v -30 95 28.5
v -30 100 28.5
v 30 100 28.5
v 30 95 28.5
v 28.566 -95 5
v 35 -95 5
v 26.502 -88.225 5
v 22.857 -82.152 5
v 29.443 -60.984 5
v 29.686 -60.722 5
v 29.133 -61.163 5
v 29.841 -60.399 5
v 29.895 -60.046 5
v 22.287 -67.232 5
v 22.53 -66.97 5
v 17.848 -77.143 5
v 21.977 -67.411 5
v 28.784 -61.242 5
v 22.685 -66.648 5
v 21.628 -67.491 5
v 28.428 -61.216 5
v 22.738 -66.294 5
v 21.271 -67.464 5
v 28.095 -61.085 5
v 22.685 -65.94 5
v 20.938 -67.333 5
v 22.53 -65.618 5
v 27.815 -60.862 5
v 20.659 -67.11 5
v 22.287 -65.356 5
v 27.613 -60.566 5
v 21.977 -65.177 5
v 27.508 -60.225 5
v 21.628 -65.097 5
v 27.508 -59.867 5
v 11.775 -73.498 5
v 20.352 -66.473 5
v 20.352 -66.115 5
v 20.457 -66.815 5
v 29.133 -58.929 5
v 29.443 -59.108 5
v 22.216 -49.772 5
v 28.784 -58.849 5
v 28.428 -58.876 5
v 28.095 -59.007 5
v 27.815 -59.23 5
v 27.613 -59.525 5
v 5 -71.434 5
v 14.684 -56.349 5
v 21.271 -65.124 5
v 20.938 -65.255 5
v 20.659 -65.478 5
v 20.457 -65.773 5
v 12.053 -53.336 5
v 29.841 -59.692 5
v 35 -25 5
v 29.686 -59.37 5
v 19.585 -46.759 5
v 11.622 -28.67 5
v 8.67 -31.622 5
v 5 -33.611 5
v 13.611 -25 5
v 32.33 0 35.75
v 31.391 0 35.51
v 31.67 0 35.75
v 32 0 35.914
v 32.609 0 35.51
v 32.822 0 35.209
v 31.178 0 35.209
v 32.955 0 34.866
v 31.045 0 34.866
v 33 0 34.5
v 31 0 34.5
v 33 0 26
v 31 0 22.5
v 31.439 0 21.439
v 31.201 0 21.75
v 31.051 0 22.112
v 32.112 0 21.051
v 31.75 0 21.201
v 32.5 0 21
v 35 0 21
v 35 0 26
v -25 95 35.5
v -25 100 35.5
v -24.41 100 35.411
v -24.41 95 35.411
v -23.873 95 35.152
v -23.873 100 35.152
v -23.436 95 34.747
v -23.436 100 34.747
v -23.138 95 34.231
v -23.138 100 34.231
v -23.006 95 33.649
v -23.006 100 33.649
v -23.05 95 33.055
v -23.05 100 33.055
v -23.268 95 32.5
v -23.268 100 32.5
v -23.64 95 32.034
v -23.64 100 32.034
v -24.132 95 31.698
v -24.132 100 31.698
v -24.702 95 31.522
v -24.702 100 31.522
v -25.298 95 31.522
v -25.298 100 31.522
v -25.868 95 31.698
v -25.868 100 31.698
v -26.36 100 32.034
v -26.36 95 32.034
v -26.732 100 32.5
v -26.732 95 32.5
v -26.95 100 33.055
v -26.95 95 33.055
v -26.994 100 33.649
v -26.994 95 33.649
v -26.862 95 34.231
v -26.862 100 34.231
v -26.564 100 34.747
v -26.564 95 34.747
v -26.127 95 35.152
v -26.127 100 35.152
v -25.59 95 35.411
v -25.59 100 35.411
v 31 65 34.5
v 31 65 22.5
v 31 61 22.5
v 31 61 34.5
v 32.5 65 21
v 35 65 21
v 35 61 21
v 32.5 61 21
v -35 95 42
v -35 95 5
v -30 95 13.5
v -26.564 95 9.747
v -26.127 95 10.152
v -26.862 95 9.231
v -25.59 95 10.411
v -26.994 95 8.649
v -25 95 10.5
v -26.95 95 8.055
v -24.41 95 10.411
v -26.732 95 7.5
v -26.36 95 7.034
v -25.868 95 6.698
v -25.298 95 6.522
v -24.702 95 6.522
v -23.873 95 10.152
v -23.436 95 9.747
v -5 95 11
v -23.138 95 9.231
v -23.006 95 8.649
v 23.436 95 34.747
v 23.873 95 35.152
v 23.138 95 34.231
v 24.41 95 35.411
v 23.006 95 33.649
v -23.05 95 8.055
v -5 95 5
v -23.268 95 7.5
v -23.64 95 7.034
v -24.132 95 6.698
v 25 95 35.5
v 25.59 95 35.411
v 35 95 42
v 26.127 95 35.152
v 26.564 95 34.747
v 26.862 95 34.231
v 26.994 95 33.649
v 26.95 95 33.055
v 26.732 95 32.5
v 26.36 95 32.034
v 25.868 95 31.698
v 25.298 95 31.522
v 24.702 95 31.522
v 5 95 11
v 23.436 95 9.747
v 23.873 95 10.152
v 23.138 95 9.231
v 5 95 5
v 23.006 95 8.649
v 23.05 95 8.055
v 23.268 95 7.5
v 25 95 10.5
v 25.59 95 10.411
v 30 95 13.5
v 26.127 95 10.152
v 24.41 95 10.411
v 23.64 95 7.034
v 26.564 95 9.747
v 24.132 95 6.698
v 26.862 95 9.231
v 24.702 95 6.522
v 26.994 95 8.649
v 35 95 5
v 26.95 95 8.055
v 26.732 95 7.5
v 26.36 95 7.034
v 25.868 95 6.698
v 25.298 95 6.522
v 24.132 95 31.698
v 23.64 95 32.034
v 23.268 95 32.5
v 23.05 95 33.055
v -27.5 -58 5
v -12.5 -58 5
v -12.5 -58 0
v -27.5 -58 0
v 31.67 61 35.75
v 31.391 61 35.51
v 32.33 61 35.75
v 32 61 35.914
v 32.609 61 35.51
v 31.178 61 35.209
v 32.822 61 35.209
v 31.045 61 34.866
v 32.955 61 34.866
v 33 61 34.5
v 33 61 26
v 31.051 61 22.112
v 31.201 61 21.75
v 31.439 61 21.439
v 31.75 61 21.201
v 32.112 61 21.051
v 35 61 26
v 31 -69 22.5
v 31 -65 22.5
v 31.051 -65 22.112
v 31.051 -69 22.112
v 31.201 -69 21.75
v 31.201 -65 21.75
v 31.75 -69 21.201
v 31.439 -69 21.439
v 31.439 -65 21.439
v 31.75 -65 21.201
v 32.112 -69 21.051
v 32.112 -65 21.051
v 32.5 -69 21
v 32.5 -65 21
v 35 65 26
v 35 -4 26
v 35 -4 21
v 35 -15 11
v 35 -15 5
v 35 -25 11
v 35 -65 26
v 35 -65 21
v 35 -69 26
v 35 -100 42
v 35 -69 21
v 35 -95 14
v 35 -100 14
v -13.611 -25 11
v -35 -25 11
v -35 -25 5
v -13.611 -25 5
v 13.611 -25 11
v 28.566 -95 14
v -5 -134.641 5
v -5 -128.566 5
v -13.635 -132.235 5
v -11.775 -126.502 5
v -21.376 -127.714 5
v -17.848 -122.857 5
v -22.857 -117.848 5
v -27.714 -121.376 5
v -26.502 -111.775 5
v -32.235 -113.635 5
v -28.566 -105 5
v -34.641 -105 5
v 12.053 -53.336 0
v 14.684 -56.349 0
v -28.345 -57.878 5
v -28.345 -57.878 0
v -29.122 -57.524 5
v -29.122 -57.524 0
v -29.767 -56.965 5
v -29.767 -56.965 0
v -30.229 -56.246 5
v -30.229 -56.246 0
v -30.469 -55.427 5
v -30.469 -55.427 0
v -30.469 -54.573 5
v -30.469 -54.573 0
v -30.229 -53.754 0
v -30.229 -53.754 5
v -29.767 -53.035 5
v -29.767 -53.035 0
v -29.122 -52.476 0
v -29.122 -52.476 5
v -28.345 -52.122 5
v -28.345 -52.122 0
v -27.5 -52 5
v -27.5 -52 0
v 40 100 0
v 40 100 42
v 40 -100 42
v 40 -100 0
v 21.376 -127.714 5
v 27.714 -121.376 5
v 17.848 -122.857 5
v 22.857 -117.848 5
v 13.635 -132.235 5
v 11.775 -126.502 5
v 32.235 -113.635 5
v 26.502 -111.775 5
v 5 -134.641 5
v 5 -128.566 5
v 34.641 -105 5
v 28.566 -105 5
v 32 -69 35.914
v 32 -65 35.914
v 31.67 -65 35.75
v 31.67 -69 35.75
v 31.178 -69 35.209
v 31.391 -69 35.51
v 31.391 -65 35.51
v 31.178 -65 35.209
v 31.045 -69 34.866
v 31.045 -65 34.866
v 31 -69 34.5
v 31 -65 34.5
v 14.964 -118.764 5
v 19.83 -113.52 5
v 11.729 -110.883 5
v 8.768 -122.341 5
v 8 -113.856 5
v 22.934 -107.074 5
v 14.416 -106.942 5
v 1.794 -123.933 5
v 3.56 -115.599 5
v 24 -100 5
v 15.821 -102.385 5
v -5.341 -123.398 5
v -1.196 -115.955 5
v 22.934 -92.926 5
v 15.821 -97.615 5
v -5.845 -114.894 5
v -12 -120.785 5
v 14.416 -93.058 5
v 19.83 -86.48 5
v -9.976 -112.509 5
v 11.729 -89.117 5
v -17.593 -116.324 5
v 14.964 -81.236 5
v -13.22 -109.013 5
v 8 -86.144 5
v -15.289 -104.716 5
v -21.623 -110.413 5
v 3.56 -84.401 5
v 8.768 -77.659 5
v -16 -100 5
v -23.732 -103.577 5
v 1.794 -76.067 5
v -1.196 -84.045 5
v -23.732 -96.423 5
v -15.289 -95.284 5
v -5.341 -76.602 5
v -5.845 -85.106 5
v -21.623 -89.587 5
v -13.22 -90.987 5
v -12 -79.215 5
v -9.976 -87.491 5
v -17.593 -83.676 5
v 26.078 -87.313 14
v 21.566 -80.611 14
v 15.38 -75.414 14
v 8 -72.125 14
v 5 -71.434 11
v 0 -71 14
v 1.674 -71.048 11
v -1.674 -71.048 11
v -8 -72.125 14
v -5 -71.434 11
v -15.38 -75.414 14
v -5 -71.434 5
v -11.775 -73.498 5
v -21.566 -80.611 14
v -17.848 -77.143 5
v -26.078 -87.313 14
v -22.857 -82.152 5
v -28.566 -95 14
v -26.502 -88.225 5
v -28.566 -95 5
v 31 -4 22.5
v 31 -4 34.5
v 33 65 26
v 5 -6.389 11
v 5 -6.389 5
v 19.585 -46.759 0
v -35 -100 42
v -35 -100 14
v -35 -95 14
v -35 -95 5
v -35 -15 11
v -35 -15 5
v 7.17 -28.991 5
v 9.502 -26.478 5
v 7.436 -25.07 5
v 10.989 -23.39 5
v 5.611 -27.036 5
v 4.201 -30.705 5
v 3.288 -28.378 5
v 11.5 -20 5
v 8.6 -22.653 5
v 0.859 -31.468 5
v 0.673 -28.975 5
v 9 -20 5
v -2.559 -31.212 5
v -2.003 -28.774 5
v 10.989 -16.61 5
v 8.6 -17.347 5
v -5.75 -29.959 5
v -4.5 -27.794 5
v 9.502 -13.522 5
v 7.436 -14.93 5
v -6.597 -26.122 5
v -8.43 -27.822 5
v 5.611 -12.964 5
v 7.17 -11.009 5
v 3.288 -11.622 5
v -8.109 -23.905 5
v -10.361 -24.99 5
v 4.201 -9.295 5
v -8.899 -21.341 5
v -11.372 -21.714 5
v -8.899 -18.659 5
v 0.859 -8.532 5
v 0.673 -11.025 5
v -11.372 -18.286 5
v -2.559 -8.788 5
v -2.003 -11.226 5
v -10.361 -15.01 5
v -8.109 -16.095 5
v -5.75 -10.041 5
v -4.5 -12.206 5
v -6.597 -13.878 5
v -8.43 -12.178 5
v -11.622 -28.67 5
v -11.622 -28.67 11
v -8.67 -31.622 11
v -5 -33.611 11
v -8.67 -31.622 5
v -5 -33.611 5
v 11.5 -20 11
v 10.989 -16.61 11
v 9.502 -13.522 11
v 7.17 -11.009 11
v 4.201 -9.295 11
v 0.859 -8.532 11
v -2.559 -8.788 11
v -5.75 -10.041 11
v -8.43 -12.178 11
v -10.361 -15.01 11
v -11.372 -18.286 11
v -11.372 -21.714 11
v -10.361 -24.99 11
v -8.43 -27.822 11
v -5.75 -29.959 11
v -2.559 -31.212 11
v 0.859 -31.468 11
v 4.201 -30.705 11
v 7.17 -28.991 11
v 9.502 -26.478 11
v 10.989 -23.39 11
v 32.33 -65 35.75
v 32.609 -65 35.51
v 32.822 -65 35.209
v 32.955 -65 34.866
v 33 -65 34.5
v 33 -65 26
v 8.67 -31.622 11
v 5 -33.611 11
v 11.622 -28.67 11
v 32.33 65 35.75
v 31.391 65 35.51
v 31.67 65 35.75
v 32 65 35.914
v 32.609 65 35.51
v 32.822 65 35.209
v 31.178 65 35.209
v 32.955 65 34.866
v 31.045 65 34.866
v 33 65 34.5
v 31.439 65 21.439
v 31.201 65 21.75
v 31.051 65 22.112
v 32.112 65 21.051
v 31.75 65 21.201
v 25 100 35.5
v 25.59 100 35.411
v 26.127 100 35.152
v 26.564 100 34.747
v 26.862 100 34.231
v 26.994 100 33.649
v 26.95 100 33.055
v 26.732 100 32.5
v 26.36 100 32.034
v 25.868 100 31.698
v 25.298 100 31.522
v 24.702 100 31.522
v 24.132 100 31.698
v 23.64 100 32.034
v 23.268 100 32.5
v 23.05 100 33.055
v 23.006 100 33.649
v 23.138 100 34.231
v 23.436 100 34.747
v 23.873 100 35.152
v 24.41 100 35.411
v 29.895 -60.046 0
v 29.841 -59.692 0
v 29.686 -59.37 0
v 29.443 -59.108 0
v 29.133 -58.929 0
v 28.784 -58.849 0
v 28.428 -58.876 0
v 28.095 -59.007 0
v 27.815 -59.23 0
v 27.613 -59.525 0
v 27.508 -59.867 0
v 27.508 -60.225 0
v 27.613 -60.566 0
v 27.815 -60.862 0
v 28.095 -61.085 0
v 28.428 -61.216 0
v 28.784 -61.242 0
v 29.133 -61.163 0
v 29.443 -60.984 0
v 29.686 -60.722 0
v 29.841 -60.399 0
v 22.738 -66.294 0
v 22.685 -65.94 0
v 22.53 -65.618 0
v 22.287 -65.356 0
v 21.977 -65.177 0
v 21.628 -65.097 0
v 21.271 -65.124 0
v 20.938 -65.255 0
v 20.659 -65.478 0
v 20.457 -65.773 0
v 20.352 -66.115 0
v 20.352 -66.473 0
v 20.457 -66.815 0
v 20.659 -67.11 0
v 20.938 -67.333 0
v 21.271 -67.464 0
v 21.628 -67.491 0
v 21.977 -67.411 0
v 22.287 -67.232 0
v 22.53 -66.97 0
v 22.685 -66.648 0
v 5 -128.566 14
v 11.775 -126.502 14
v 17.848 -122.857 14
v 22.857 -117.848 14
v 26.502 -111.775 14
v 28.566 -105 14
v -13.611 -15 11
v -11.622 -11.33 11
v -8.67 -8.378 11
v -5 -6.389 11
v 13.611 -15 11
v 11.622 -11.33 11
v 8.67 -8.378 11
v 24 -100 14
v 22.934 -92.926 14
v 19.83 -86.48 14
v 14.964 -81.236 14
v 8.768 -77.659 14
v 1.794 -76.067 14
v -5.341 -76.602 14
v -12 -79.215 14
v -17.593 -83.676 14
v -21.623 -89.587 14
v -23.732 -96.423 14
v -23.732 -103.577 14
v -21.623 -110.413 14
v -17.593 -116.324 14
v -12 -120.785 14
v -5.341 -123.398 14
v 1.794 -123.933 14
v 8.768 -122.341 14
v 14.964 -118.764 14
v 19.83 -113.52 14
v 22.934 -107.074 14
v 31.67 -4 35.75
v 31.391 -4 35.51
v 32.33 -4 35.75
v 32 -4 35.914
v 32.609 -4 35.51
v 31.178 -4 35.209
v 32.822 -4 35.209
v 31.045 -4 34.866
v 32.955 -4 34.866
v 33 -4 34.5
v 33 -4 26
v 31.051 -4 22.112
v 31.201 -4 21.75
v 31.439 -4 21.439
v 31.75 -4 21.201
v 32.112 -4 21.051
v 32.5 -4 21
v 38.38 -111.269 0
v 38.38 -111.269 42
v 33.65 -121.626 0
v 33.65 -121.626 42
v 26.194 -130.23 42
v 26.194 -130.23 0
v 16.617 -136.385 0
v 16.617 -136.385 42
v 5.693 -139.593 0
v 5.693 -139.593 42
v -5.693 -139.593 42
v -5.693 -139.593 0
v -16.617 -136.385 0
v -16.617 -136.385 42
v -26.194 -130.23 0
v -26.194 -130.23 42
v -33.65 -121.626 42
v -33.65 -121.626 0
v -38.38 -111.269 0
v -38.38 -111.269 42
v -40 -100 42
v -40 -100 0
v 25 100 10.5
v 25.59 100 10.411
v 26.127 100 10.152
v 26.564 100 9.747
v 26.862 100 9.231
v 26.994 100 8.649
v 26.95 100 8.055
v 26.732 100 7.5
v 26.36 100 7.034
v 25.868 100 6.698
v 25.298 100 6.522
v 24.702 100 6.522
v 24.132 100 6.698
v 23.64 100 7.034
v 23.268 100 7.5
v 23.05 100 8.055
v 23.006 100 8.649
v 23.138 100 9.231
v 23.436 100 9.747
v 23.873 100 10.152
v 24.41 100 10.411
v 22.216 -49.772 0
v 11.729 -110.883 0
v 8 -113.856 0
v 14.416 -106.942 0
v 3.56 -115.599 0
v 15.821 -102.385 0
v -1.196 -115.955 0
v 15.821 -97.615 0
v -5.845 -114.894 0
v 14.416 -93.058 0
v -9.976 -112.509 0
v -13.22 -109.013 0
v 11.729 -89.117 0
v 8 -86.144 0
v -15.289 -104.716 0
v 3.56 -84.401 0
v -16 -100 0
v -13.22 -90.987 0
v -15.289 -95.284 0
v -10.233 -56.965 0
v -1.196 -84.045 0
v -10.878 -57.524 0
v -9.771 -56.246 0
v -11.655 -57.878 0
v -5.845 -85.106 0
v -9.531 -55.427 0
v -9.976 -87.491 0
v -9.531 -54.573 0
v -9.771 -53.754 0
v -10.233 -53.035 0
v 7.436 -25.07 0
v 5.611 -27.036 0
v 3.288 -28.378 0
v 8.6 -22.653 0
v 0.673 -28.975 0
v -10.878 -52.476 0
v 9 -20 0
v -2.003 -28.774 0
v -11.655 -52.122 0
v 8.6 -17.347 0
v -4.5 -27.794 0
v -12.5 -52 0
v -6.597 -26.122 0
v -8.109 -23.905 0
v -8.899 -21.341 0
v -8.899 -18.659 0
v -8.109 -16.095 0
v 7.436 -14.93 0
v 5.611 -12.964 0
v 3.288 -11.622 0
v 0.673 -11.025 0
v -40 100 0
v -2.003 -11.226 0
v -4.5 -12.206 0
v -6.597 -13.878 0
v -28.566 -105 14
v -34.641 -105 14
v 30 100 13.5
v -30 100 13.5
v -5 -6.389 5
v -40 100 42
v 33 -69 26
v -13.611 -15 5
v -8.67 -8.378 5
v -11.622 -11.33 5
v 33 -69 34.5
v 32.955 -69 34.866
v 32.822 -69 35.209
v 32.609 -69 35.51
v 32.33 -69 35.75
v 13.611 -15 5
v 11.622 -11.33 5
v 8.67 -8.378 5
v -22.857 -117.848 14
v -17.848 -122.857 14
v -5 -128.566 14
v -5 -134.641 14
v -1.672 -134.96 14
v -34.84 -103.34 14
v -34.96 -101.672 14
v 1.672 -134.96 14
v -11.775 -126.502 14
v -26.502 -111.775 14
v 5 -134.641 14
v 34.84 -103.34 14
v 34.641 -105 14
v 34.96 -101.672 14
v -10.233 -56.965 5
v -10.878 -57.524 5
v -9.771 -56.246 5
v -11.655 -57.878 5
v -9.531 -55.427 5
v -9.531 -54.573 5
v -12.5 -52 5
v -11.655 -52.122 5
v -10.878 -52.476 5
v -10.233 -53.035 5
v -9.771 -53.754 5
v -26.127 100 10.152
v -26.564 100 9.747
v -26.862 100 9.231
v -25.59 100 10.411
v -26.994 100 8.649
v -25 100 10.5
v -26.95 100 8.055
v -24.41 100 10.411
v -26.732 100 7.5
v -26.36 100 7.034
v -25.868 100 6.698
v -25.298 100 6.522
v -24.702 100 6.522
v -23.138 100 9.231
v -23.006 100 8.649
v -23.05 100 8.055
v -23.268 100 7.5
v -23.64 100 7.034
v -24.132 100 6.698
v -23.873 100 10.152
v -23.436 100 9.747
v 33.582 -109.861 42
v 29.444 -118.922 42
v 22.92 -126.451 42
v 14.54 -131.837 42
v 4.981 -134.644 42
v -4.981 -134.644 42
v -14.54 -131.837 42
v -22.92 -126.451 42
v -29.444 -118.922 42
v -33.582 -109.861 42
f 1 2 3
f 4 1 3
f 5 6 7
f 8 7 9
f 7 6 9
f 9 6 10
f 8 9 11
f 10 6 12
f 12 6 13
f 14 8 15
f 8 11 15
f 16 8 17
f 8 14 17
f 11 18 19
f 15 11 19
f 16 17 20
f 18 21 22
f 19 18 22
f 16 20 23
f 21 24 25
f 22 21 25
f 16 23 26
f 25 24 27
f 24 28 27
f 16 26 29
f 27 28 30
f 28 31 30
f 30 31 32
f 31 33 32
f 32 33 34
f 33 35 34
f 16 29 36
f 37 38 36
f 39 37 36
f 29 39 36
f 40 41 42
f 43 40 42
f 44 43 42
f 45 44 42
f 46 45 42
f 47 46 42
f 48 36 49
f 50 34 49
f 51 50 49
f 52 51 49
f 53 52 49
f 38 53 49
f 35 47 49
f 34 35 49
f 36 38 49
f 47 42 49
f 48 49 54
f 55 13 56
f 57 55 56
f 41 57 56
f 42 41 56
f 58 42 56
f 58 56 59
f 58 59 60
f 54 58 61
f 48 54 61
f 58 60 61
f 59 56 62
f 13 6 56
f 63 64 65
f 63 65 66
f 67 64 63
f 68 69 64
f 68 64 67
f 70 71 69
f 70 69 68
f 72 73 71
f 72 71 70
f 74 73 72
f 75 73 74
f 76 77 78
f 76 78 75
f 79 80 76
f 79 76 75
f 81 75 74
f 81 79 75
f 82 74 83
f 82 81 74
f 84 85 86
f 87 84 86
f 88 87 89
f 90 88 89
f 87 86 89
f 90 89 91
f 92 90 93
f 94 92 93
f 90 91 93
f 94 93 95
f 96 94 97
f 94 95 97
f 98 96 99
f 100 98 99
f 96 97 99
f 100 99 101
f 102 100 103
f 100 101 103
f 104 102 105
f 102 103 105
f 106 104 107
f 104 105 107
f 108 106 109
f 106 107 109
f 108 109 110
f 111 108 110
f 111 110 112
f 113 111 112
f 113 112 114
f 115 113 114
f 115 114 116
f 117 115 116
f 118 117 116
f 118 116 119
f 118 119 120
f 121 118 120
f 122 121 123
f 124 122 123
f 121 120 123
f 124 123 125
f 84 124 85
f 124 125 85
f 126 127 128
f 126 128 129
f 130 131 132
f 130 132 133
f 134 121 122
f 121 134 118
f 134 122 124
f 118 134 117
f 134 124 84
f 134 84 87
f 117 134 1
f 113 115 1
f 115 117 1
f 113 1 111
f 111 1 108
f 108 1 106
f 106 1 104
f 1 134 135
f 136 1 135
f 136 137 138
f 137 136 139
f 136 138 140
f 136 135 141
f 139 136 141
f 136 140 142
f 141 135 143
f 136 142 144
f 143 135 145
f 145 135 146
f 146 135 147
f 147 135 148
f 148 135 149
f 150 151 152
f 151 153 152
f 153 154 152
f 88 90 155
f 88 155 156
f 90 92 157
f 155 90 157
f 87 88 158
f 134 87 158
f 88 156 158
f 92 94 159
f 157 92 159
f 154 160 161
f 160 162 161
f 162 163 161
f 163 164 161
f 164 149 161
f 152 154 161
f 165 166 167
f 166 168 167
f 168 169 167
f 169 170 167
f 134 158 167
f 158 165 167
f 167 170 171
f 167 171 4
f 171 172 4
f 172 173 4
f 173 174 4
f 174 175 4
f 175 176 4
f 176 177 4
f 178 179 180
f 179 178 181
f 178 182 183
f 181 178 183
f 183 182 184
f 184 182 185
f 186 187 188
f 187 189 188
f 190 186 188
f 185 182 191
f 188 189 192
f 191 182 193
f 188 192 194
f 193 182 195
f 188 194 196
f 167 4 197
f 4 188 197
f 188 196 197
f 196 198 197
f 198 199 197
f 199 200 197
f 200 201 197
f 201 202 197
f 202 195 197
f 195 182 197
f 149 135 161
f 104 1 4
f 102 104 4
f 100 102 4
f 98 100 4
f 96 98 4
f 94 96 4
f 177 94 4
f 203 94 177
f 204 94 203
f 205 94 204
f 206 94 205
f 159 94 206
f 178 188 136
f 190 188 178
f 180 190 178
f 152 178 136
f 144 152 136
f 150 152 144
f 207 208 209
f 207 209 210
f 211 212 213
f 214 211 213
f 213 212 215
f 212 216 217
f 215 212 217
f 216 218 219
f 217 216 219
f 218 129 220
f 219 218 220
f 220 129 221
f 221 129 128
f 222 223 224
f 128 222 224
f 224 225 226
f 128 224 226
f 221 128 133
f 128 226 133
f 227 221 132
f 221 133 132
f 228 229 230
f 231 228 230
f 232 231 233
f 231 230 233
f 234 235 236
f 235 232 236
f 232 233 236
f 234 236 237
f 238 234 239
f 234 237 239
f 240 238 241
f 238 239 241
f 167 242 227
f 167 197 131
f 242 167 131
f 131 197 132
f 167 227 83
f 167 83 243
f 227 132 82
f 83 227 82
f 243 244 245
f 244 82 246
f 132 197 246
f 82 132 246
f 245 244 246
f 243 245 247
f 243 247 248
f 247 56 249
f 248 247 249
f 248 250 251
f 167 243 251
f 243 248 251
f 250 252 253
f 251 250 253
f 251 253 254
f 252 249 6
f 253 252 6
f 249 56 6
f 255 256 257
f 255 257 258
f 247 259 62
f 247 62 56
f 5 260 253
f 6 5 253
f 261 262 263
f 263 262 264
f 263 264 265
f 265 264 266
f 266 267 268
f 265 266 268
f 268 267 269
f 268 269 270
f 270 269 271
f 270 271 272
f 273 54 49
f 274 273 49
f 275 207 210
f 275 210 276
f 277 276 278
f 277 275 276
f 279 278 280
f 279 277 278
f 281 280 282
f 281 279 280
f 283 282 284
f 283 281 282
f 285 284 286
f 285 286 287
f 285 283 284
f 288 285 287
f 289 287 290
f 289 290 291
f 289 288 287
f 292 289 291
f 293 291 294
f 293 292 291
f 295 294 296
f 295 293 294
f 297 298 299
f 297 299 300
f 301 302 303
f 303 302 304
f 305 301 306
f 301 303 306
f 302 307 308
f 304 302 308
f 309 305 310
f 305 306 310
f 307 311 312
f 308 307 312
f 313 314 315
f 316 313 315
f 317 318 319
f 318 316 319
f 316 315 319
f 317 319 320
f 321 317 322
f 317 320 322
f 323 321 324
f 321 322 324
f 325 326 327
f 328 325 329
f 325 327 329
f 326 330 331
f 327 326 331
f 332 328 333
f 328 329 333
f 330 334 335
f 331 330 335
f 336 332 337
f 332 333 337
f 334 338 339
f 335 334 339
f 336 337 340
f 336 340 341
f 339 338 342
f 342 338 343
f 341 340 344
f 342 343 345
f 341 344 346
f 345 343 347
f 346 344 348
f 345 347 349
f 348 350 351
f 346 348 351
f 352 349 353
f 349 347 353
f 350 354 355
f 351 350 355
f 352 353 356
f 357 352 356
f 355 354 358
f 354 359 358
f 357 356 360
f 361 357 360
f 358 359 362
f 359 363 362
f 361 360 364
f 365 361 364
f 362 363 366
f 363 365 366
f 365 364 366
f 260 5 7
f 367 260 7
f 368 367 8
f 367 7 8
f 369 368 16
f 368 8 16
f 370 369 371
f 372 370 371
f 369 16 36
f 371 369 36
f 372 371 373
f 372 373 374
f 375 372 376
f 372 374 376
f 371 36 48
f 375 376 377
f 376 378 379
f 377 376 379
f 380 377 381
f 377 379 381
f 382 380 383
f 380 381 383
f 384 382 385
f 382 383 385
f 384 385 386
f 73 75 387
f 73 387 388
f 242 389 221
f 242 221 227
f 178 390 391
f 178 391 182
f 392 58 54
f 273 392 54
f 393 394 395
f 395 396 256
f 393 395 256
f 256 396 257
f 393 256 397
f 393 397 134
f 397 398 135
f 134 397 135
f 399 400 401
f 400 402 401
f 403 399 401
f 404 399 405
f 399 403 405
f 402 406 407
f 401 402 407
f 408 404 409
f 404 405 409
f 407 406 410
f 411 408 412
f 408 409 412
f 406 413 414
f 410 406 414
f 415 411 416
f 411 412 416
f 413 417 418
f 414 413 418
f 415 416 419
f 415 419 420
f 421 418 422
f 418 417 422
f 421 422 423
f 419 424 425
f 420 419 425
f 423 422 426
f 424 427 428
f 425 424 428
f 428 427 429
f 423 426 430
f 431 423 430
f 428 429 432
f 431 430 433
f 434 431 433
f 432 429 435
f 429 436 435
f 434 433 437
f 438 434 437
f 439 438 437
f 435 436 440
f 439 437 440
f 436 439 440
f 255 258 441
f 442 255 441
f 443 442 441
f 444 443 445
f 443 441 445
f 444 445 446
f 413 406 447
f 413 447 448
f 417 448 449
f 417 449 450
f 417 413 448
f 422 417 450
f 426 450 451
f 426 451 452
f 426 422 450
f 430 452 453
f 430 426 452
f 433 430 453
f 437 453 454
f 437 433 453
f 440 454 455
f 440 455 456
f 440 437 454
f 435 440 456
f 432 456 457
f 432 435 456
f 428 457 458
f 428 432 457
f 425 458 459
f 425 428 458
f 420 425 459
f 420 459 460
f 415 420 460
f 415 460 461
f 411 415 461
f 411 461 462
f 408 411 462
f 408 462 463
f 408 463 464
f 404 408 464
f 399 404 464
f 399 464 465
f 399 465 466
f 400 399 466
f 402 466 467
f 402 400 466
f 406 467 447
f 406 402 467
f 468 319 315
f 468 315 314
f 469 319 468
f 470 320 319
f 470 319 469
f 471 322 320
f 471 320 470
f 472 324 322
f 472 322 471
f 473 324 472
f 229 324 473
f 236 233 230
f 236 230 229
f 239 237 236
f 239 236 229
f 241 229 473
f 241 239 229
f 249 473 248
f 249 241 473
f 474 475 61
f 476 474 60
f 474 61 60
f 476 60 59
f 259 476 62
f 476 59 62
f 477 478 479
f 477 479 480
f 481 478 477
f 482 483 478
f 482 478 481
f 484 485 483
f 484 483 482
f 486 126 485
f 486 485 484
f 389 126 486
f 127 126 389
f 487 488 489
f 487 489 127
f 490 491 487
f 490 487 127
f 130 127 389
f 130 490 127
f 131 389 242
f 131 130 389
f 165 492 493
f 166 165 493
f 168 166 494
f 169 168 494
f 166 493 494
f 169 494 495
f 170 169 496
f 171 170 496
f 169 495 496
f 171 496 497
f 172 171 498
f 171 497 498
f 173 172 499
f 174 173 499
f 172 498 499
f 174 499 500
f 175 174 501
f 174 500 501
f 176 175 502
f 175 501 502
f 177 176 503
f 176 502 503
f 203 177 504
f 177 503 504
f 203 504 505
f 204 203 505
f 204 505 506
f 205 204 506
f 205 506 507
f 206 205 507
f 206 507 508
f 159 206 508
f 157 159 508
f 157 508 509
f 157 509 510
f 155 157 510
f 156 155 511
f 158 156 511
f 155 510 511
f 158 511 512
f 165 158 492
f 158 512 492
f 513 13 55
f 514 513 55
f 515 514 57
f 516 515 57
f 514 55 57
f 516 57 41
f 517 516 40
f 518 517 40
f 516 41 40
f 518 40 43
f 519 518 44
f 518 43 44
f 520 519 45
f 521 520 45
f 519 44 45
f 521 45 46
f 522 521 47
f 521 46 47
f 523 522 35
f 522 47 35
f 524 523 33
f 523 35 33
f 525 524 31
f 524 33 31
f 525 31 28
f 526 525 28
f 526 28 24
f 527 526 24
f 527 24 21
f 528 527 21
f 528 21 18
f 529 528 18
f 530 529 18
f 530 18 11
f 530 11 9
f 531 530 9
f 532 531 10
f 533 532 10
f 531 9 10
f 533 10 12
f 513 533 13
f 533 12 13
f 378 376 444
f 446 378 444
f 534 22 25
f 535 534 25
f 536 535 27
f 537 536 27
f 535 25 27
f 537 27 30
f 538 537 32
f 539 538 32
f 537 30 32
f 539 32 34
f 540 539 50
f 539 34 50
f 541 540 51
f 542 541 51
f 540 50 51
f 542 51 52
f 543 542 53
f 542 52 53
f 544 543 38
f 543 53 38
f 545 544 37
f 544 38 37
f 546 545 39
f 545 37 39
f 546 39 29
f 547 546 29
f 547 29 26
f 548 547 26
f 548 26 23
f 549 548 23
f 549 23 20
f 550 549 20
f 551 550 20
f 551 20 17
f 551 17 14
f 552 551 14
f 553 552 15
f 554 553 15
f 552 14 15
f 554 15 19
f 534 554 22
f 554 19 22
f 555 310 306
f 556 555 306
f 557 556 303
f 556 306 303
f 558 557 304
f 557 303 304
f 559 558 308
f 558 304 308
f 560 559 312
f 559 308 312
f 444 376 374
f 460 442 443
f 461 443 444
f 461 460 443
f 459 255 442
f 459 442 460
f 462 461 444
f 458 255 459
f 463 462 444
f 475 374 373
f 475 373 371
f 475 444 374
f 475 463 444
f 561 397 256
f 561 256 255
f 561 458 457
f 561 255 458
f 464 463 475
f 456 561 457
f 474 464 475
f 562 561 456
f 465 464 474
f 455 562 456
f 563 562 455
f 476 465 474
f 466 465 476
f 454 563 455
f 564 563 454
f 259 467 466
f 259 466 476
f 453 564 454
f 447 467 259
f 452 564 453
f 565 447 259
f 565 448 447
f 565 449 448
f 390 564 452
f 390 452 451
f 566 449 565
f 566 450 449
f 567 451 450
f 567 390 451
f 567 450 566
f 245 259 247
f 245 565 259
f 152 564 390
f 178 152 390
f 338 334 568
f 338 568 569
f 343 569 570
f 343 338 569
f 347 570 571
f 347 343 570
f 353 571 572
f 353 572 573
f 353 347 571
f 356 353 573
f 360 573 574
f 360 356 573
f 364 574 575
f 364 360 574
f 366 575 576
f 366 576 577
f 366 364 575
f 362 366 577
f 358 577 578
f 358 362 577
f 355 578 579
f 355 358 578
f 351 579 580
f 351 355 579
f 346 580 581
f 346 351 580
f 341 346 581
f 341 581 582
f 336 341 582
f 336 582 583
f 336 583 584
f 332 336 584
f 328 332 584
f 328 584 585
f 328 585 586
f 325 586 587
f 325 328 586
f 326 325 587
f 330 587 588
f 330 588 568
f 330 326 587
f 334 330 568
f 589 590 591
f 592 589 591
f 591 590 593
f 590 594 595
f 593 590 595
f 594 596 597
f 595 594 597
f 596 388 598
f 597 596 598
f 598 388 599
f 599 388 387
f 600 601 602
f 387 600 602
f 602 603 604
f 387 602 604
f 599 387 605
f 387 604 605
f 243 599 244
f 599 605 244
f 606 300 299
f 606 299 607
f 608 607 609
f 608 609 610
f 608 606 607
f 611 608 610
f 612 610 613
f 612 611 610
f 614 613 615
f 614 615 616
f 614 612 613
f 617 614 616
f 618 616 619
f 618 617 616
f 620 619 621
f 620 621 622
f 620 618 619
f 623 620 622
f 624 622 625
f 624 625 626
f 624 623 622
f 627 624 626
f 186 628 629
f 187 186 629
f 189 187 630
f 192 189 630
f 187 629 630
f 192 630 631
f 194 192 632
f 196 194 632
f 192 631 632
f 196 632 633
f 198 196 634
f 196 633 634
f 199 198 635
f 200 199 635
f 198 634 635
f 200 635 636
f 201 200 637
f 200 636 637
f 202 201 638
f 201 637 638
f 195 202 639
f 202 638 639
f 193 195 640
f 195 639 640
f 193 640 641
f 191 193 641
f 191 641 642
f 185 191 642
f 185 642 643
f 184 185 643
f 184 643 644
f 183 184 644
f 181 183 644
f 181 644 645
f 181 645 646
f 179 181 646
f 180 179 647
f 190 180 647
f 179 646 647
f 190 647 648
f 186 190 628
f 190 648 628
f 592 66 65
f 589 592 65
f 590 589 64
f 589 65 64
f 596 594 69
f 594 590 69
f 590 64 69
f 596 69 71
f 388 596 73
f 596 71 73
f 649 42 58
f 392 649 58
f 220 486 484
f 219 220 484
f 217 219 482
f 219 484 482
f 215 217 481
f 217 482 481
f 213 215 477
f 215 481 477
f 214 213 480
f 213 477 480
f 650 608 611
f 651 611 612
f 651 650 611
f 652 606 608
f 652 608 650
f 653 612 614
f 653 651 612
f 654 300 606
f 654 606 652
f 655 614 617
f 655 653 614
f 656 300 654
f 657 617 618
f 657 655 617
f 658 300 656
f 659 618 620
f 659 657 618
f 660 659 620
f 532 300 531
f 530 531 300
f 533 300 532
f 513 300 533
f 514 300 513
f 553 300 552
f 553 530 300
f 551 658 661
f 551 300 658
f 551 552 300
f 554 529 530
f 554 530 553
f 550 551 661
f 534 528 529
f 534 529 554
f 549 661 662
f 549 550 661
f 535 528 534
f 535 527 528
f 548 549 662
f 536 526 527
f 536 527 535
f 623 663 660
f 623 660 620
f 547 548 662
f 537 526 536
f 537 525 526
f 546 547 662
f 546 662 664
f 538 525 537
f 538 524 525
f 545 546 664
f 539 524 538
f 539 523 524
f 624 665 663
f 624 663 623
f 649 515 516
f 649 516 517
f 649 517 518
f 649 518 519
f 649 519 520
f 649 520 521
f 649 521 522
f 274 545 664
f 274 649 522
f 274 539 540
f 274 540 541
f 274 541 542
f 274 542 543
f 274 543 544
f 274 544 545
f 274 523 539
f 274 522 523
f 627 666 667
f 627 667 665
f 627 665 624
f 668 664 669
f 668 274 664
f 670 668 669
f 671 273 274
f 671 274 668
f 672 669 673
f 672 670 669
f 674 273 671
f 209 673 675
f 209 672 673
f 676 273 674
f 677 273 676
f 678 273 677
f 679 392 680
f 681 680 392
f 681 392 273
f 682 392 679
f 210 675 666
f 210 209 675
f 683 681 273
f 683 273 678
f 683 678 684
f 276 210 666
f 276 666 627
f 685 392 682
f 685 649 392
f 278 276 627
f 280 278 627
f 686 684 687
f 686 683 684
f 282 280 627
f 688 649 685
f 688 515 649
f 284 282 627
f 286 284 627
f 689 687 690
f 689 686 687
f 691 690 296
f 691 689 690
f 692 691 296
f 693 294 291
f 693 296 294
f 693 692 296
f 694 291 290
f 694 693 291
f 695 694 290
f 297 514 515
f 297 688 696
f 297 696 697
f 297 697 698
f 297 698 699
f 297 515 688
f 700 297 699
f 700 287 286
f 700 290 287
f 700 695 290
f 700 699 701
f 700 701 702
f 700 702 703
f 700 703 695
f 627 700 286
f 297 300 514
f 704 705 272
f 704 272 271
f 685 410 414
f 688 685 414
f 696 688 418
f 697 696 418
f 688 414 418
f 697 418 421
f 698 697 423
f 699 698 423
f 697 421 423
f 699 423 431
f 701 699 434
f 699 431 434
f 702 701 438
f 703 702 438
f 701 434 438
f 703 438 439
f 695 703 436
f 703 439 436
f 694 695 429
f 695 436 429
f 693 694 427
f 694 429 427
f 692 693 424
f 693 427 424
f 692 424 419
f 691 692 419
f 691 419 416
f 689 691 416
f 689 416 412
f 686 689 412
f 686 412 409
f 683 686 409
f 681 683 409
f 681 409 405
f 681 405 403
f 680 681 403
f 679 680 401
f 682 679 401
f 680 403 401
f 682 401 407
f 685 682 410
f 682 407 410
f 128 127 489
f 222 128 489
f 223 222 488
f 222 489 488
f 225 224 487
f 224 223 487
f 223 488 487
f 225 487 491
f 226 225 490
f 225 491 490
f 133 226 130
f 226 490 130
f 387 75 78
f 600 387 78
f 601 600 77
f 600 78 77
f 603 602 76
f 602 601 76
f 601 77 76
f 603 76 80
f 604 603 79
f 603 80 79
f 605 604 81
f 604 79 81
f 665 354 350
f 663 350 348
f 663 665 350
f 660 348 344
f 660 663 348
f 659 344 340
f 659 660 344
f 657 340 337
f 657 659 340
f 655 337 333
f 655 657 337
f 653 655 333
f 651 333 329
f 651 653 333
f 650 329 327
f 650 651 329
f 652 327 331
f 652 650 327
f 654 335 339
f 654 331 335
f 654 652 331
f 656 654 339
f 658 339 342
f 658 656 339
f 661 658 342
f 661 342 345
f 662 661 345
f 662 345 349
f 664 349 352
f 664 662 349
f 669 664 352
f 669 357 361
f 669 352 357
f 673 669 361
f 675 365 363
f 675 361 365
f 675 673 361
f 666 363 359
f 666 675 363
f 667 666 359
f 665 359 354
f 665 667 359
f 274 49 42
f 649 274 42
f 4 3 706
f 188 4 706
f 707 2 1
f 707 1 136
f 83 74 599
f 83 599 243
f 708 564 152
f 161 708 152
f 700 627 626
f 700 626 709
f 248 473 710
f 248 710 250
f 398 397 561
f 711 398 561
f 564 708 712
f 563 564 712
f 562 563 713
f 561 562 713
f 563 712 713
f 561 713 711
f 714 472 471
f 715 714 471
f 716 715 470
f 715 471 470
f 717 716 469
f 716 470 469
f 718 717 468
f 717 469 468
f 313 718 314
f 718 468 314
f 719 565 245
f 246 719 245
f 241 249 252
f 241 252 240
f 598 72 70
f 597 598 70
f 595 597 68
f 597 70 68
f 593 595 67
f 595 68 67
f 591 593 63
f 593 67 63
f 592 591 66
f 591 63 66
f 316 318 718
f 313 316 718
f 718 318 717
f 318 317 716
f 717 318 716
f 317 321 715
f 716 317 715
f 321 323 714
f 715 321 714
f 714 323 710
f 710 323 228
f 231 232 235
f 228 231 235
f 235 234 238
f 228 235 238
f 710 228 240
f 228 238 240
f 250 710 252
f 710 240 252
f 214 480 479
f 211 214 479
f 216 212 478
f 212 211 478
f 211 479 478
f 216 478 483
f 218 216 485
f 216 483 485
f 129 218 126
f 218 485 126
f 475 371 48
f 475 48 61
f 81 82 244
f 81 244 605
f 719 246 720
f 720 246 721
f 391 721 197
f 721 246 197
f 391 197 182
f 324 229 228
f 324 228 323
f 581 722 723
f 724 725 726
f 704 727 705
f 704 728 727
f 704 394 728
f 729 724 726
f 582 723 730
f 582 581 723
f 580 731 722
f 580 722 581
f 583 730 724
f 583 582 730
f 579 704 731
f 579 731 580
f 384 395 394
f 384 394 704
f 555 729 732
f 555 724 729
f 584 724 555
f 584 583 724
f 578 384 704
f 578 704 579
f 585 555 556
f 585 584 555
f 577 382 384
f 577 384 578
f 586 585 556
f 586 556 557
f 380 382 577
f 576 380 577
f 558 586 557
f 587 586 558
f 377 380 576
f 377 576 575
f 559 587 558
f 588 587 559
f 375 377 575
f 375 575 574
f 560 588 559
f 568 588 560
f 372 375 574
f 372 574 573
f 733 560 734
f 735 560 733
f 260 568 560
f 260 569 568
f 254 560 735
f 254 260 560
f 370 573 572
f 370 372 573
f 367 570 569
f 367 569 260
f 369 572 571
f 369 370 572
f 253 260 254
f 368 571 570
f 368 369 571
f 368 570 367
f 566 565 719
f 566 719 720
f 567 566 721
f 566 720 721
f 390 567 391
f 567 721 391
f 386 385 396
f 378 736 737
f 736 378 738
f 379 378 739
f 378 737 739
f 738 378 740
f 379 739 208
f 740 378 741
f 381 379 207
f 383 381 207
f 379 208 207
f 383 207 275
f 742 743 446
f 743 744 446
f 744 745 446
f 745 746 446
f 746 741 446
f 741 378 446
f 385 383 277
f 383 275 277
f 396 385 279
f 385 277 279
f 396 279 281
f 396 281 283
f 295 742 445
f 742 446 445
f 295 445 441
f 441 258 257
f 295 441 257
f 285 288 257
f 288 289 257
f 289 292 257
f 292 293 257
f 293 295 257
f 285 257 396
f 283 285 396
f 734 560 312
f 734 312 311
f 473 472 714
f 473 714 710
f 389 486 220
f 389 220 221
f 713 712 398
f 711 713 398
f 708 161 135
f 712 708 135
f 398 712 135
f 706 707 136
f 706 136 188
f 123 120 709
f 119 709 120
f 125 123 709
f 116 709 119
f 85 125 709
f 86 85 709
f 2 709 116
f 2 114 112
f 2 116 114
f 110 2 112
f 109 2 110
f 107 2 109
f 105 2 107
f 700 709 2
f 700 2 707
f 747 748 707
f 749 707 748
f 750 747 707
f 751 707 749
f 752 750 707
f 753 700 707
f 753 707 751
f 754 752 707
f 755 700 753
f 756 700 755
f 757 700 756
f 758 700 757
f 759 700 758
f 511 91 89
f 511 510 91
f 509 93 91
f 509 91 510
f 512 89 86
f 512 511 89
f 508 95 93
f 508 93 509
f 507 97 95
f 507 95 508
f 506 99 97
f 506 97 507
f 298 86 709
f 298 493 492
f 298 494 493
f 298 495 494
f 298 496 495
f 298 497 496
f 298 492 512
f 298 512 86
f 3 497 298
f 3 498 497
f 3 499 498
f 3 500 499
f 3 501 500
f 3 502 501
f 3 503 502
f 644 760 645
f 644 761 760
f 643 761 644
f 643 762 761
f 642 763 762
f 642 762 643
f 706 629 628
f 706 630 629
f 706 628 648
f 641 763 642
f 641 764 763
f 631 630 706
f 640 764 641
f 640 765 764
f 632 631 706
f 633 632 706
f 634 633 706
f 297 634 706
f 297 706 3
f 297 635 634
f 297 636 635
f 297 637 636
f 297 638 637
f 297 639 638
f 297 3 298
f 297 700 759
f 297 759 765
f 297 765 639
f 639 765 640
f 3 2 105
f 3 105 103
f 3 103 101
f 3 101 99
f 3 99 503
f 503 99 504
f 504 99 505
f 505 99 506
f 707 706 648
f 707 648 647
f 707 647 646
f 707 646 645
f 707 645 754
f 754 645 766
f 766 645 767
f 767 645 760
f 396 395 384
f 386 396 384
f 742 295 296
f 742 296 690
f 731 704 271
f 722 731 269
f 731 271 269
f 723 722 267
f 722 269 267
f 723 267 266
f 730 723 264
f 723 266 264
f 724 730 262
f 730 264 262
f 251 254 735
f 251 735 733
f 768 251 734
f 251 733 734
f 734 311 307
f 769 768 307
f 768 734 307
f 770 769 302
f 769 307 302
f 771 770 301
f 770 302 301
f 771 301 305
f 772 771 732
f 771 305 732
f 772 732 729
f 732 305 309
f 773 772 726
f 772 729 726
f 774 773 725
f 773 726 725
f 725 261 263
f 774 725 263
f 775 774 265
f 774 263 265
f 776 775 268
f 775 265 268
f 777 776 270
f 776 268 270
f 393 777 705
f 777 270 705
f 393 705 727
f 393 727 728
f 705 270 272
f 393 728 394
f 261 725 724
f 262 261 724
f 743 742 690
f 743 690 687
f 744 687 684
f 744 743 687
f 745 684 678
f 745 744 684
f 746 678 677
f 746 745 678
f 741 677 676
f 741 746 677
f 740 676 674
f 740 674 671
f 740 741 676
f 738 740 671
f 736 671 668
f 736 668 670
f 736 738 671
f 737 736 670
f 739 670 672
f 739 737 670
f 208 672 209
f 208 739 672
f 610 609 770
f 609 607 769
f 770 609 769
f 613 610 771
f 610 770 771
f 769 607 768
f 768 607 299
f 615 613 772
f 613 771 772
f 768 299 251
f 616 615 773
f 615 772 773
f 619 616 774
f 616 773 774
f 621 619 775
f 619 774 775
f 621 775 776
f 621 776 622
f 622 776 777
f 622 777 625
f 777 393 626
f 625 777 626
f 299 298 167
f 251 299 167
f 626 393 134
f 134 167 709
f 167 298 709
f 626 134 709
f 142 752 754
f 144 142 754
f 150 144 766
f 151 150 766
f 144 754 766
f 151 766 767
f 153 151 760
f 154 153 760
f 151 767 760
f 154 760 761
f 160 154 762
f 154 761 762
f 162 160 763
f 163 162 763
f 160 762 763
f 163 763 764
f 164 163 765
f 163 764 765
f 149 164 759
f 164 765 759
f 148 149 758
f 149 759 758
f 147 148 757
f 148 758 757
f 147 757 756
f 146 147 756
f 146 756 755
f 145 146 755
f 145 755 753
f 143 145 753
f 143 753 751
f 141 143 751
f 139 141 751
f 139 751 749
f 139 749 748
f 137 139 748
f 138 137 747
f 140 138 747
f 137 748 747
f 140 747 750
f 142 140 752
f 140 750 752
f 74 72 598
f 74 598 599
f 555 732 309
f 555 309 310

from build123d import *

# Parameters (mm, degrees)
ESBO_O1_R                   = 16
RESSALTO_EXTRUS_O1_DEPTH    = 42
CASCA1_T                    = -5
ESBO_O3_R                   = 2
ESBO_O3_W                   = 60
ESBO_O3_H                   = 15
CORTE_EXTRUS_O1_DEPTH       = 5
ESBO_O4_R                   = 29
ESBO_O4_R_2                 = 24
RESSALTO_EXTRUS_O2_DEPTH    = 9
ESBO_O5_R                   = 9
CORTE_EXTRUS_O2_DEPTH       = 5
ESBO_O6_R                   = 14.5
ESBO_O6_R_2                 = 11.5
RESSALTO_EXTRUS_O3_DEPTH    = 6
NERVURA1_REACH              = 150.27
ESBO_O7_WALLS_W             = 304.540047886
ESBO_O7_WALLS_H             = 10
ESBO_O7_WALLS_W_2           = 10
ESBO_O7_WALLS_H_2           = 304.540047886
NERVURA2_REACH              = 150.866
ESBO_O8_WALLS_W             = 320.231422594
ESBO_O8_WALLS_H             = 10
ESBO_O8_WALLS_W_2           = 10
ESBO_O8_WALLS_H_2           = 400.231422594
ESBO_O8_WALLS_H_3           = 336.231422594
CORTE_EXTRUS_O3_DEPTH       = 5
ESBO_O10_R                  = 1.2
CORTE_EXTRUS_O4_DEPTH       = 5
RESSALTO_EXTRUS_O4_DEPTH    = 4
FILETE1_R                   = 1.5
PADR_O_LINEAR1_COUNT        = 3
PADR_O_LINEAR1_PITCH        = 65
FILETE1_OF_PADR_O_LINEAR1_R = 1.5


with BuildPart() as part:
    # Esboço1 → Ressalto-extrusão1 (new body)
    with BuildSketch(Plane.XY):
        with BuildLine():
            Line((-40, -100), (-40, 100))
            Line((-40, 100), (40, 100))
            Line((40, 100), (40, -100))
            ThreePointArc((40, -100), (0, -140), (-40, -100))
        make_face()
        with Locations(Location((0, -100, 0), (0, 0, 180))):
            Circle(ESBO_O1_R, mode=Mode.SUBTRACT)
    extrude(amount=RESSALTO_EXTRUS_O1_DEPTH)

    # Casca1
    casca1_openings = [part.faces().sort_by_distance(p)[0] for p in [
        (0, -12.059912395, 42),
        (16, -100, 21),
    ]]
    offset(amount=CASCA1_T, openings=casca1_openings, kind=Kind.INTERSECTION)

    # Esboço3 → Corte-extrusão1 (cut)
    with BuildSketch(Plane(origin=(0, 100, 0), x_dir=(1, 0, 0), z_dir=(0, 1, 0))):
        with Locations(Location((25, -33.5, 0), (0, 0, 270))):
            Circle(ESBO_O3_R)
        with Locations(Location((-25, -33.5, 0), (0, 0, 270))):
            Circle(ESBO_O3_R)
        with Locations(Location((-25, -8.5, 0), (0, 0, 270))):
            Circle(ESBO_O3_R)
        with Locations(Location((25, -8.5, 0), (0, 0, 270))):
            Circle(ESBO_O3_R)
        with Locations((0, -21)):
            Rectangle(ESBO_O3_W, ESBO_O3_H)
    extrude(amount=-CORTE_EXTRUS_O1_DEPTH, mode=Mode.SUBTRACT)

    # Esboço4 → Ressalto-extrusão2 (add)
    with BuildSketch(Plane.XY.offset(5)):
        with Locations((0, -100)):
            Circle(ESBO_O4_R)
        with Locations((0, -100)):
            Circle(ESBO_O4_R_2, mode=Mode.SUBTRACT)
    extrude(amount=RESSALTO_EXTRUS_O2_DEPTH)

    # Esboço5 → Corte-extrusão2 (cut)
    with BuildSketch(Plane.XY.offset(5)):
        with Locations((0, -20)):
            Circle(ESBO_O5_R)
    extrude(amount=-CORTE_EXTRUS_O2_DEPTH, mode=Mode.SUBTRACT)

    # Esboço6 → Ressalto-extrusão3 (add)
    with BuildSketch(Plane.XY.offset(5)):
        with Locations((0, -20)):
            Circle(ESBO_O6_R)
        with Locations((0, -20)):
            Circle(ESBO_O6_R_2, mode=Mode.SUBTRACT)
    extrude(amount=RESSALTO_EXTRUS_O3_DEPTH)

    # Esboço7 walls → Nervura1 (add, up to next)
    with BuildSketch(Plane.XY.offset(14), mode=Mode.PRIVATE) as nervura1_sk1:
        with Locations((32, -100)):
            Rectangle(ESBO_O7_WALLS_W, ESBO_O7_WALLS_H)
    nervura1_tool1 = extrude(nervura1_sk1.sketch, amount=-NERVURA1_REACH, mode=Mode.PRIVATE) - part.part
    # Esboço7 walls → Nervura1 (add, up to next)
    with BuildSketch(Plane.XY.offset(14), mode=Mode.PRIVATE) as nervura1_sk2:
        with Locations((-32, -100)):
            Rectangle(ESBO_O7_WALLS_W, ESBO_O7_WALLS_H)
    nervura1_tool2 = extrude(nervura1_sk2.sketch, amount=-NERVURA1_REACH, mode=Mode.PRIVATE) - part.part
    # Esboço7 walls → Nervura1 (add, up to next)
    with BuildSketch(Plane.XY.offset(14), mode=Mode.PRIVATE) as nervura1_sk3:
        with Locations((0, -132)):
            Rectangle(ESBO_O7_WALLS_W_2, ESBO_O7_WALLS_H_2)
    nervura1_tool3 = extrude(nervura1_sk3.sketch, amount=-NERVURA1_REACH, mode=Mode.PRIVATE) - part.part
    add(nervura1_tool1.solids().sort_by_distance((32, -100, 14))[0])
    add(nervura1_tool2.solids().sort_by_distance((-32, -100, 14))[0])
    add(nervura1_tool3.solids().sort_by_distance((0, -132, 14))[0])

    # Esboço8 walls → Nervura2 (add, up to next)
    with BuildSketch(Plane.XY.offset(11), mode=Mode.PRIVATE) as nervura2_sk1:
        with Locations((24.75, -20)):
            Rectangle(ESBO_O8_WALLS_W, ESBO_O8_WALLS_H)
    nervura2_tool1 = extrude(nervura2_sk1.sketch, amount=-NERVURA2_REACH, mode=Mode.PRIVATE) - part.part
    # Esboço8 walls → Nervura2 (add, up to next)
    with BuildSketch(Plane.XY.offset(11), mode=Mode.PRIVATE) as nervura2_sk2:
        with Locations((-24.75, -20)):
            Rectangle(ESBO_O8_WALLS_W, ESBO_O8_WALLS_H)
    nervura2_tool2 = extrude(nervura2_sk2.sketch, amount=-NERVURA2_REACH, mode=Mode.PRIVATE) - part.part
    # Esboço8 walls → Nervura2 (add, up to next)
    with BuildSketch(Plane.XY.offset(11), mode=Mode.PRIVATE) as nervura2_sk3:
        with Locations((0, 44.75)):
            Rectangle(ESBO_O8_WALLS_W_2, ESBO_O8_WALLS_H_2)
    nervura2_tool3 = extrude(nervura2_sk3.sketch, amount=-NERVURA2_REACH, mode=Mode.PRIVATE) - part.part
    # Esboço8 walls → Nervura2 (add, up to next)
    with BuildSketch(Plane.XY.offset(11), mode=Mode.PRIVATE) as nervura2_sk4:
        with Locations((0, -52.75)):
            Rectangle(ESBO_O8_WALLS_W_2, ESBO_O8_WALLS_H_3)
    nervura2_tool4 = extrude(nervura2_sk4.sketch, amount=-NERVURA2_REACH, mode=Mode.PRIVATE) - part.part
    add(nervura2_tool1.solids().sort_by_distance((24.75, -20, 11))[0])
    add(nervura2_tool2.solids().sort_by_distance((-24.75, -20, 11))[0])
    add(nervura2_tool3.solids().sort_by_distance((0, 44.75, 11))[0])
    add(nervura2_tool4.solids().sort_by_distance((0, -52.75, 11))[0])

    # Esboço9 → Corte-extrusão3 (cut)
    with BuildSketch(Plane.XY.offset(5)):
        with BuildLine():
            Line((-27.5, -52), (-12.5, -52))
            ThreePointArc((-12.5, -52), (-9.5, -55), (-12.5, -58))
            Line((-12.5, -58), (-27.5, -58))
            ThreePointArc((-27.5, -58), (-30.5, -55), (-27.5, -52))
        make_face()
    extrude(amount=-CORTE_EXTRUS_O3_DEPTH, mode=Mode.SUBTRACT)

    # Esboço10 → Corte-extrusão4 (cut)
    with BuildSketch(Plane.XY.offset(5)):
        with Locations((21.538461538, -66.293996461)):
            Circle(ESBO_O10_R)
        with Locations((28.694536951, -60.045749932)):
            Circle(ESBO_O10_R)
        Polygon((14.683545029, -56.348769838), (22.216255989, -49.771668228), (19.585415345, -46.758583844), (12.052704385, -53.335685454), align=None)
    extrude(amount=-CORTE_EXTRUS_O4_DEPTH, mode=Mode.SUBTRACT)

    # Esboço11 → Ressalto-extrusão4 (add)
    with BuildSketch(Plane(origin=(0, -65, 0), x_dir=(-1, 0, 0), z_dir=(0, -1, 0))):
        Polygon((-40, -21), (-31, -21), (-31, -36), (-33, -36), (-33, -26), (-40, -26), align=None)
    ressalto_extrus_o4 = extrude(amount=RESSALTO_EXTRUS_O4_DEPTH)

    # Filete1
    # the kernel refuses this fillet: 1.5 mm, written as the material it takes off along each edge
    with BuildSketch(Plane(origin=(31, -61.25, 21), x_dir=(1, 0, 0), z_dir=(0, -1, 0)), Plane(origin=(31, -61.25, 36), x_dir=(0, 0, -1), z_dir=(0, -1, 0))) as filete1_piece_1:
        with BuildLine():
            CenterArc((FILETE1_R, FILETE1_R), FILETE1_R, 180, 90)
            Line((0, FILETE1_R), (0, 0))
            Line((0, 0), (FILETE1_R, 0))
        make_face()
    extrude(amount=11.5, mode=Mode.SUBTRACT)
    with BuildSketch(Plane(origin=(33, -61.25, 36), x_dir=(0, 0, -1), z_dir=(0, -1, 0))) as filete1_piece_2:
        with BuildLine():
            CenterArc((FILETE1_R, -FILETE1_R), FILETE1_R, 90, 90)
            Line((0, -FILETE1_R), (0, 0))
            Line((0, 0), (FILETE1_R, 0))
        make_face()
    extrude(amount=11.5, mode=Mode.SUBTRACT)

    # Padrão linear1: Ressalto-extrusão4 ×3
    with Locations(*[(0, i * PADR_O_LINEAR1_PITCH, 0) for i in range(1, PADR_O_LINEAR1_COUNT)]):
        add(ressalto_extrus_o4)

    # Filete1 of Padrão linear1
    # the kernel refuses this fillet: 1.5 mm, written as the material it takes off along each edge
    with BuildSketch(Plane(origin=(31, 3.75, 21), x_dir=(1, 0, 0), z_dir=(0, -1, 0)), Plane(origin=(31, 3.75, 36), x_dir=(0, 0, -1), z_dir=(0, -1, 0)), Plane(origin=(31, 68.75, 21), x_dir=(1, 0, 0), z_dir=(0, -1, 0)), Plane(origin=(31, 68.75, 36), x_dir=(0, 0, -1), z_dir=(0, -1, 0))) as filete1_of_padr_o_linear1_piece_1:
        with BuildLine():
            CenterArc((FILETE1_OF_PADR_O_LINEAR1_R, FILETE1_OF_PADR_O_LINEAR1_R), FILETE1_OF_PADR_O_LINEAR1_R, 180, 90)
            Line((0, FILETE1_OF_PADR_O_LINEAR1_R), (0, 0))
            Line((0, 0), (FILETE1_OF_PADR_O_LINEAR1_R, 0))
        make_face()
    extrude(amount=11.5, mode=Mode.SUBTRACT)
    with BuildSketch(Plane(origin=(33, 3.75, 36), x_dir=(0, 0, -1), z_dir=(0, -1, 0)), Plane(origin=(33, 68.75, 36), x_dir=(0, 0, -1), z_dir=(0, -1, 0))) as filete1_of_padr_o_linear1_piece_2:
        with BuildLine():
            CenterArc((FILETE1_OF_PADR_O_LINEAR1_R, -FILETE1_OF_PADR_O_LINEAR1_R), FILETE1_OF_PADR_O_LINEAR1_R, 90, 90)
            Line((0, -FILETE1_OF_PADR_O_LINEAR1_R), (0, 0))
            Line((0, 0), (FILETE1_OF_PADR_O_LINEAR1_R, 0))
        make_face()
    extrude(amount=11.5, mode=Mode.SUBTRACT)


solid = part.part
